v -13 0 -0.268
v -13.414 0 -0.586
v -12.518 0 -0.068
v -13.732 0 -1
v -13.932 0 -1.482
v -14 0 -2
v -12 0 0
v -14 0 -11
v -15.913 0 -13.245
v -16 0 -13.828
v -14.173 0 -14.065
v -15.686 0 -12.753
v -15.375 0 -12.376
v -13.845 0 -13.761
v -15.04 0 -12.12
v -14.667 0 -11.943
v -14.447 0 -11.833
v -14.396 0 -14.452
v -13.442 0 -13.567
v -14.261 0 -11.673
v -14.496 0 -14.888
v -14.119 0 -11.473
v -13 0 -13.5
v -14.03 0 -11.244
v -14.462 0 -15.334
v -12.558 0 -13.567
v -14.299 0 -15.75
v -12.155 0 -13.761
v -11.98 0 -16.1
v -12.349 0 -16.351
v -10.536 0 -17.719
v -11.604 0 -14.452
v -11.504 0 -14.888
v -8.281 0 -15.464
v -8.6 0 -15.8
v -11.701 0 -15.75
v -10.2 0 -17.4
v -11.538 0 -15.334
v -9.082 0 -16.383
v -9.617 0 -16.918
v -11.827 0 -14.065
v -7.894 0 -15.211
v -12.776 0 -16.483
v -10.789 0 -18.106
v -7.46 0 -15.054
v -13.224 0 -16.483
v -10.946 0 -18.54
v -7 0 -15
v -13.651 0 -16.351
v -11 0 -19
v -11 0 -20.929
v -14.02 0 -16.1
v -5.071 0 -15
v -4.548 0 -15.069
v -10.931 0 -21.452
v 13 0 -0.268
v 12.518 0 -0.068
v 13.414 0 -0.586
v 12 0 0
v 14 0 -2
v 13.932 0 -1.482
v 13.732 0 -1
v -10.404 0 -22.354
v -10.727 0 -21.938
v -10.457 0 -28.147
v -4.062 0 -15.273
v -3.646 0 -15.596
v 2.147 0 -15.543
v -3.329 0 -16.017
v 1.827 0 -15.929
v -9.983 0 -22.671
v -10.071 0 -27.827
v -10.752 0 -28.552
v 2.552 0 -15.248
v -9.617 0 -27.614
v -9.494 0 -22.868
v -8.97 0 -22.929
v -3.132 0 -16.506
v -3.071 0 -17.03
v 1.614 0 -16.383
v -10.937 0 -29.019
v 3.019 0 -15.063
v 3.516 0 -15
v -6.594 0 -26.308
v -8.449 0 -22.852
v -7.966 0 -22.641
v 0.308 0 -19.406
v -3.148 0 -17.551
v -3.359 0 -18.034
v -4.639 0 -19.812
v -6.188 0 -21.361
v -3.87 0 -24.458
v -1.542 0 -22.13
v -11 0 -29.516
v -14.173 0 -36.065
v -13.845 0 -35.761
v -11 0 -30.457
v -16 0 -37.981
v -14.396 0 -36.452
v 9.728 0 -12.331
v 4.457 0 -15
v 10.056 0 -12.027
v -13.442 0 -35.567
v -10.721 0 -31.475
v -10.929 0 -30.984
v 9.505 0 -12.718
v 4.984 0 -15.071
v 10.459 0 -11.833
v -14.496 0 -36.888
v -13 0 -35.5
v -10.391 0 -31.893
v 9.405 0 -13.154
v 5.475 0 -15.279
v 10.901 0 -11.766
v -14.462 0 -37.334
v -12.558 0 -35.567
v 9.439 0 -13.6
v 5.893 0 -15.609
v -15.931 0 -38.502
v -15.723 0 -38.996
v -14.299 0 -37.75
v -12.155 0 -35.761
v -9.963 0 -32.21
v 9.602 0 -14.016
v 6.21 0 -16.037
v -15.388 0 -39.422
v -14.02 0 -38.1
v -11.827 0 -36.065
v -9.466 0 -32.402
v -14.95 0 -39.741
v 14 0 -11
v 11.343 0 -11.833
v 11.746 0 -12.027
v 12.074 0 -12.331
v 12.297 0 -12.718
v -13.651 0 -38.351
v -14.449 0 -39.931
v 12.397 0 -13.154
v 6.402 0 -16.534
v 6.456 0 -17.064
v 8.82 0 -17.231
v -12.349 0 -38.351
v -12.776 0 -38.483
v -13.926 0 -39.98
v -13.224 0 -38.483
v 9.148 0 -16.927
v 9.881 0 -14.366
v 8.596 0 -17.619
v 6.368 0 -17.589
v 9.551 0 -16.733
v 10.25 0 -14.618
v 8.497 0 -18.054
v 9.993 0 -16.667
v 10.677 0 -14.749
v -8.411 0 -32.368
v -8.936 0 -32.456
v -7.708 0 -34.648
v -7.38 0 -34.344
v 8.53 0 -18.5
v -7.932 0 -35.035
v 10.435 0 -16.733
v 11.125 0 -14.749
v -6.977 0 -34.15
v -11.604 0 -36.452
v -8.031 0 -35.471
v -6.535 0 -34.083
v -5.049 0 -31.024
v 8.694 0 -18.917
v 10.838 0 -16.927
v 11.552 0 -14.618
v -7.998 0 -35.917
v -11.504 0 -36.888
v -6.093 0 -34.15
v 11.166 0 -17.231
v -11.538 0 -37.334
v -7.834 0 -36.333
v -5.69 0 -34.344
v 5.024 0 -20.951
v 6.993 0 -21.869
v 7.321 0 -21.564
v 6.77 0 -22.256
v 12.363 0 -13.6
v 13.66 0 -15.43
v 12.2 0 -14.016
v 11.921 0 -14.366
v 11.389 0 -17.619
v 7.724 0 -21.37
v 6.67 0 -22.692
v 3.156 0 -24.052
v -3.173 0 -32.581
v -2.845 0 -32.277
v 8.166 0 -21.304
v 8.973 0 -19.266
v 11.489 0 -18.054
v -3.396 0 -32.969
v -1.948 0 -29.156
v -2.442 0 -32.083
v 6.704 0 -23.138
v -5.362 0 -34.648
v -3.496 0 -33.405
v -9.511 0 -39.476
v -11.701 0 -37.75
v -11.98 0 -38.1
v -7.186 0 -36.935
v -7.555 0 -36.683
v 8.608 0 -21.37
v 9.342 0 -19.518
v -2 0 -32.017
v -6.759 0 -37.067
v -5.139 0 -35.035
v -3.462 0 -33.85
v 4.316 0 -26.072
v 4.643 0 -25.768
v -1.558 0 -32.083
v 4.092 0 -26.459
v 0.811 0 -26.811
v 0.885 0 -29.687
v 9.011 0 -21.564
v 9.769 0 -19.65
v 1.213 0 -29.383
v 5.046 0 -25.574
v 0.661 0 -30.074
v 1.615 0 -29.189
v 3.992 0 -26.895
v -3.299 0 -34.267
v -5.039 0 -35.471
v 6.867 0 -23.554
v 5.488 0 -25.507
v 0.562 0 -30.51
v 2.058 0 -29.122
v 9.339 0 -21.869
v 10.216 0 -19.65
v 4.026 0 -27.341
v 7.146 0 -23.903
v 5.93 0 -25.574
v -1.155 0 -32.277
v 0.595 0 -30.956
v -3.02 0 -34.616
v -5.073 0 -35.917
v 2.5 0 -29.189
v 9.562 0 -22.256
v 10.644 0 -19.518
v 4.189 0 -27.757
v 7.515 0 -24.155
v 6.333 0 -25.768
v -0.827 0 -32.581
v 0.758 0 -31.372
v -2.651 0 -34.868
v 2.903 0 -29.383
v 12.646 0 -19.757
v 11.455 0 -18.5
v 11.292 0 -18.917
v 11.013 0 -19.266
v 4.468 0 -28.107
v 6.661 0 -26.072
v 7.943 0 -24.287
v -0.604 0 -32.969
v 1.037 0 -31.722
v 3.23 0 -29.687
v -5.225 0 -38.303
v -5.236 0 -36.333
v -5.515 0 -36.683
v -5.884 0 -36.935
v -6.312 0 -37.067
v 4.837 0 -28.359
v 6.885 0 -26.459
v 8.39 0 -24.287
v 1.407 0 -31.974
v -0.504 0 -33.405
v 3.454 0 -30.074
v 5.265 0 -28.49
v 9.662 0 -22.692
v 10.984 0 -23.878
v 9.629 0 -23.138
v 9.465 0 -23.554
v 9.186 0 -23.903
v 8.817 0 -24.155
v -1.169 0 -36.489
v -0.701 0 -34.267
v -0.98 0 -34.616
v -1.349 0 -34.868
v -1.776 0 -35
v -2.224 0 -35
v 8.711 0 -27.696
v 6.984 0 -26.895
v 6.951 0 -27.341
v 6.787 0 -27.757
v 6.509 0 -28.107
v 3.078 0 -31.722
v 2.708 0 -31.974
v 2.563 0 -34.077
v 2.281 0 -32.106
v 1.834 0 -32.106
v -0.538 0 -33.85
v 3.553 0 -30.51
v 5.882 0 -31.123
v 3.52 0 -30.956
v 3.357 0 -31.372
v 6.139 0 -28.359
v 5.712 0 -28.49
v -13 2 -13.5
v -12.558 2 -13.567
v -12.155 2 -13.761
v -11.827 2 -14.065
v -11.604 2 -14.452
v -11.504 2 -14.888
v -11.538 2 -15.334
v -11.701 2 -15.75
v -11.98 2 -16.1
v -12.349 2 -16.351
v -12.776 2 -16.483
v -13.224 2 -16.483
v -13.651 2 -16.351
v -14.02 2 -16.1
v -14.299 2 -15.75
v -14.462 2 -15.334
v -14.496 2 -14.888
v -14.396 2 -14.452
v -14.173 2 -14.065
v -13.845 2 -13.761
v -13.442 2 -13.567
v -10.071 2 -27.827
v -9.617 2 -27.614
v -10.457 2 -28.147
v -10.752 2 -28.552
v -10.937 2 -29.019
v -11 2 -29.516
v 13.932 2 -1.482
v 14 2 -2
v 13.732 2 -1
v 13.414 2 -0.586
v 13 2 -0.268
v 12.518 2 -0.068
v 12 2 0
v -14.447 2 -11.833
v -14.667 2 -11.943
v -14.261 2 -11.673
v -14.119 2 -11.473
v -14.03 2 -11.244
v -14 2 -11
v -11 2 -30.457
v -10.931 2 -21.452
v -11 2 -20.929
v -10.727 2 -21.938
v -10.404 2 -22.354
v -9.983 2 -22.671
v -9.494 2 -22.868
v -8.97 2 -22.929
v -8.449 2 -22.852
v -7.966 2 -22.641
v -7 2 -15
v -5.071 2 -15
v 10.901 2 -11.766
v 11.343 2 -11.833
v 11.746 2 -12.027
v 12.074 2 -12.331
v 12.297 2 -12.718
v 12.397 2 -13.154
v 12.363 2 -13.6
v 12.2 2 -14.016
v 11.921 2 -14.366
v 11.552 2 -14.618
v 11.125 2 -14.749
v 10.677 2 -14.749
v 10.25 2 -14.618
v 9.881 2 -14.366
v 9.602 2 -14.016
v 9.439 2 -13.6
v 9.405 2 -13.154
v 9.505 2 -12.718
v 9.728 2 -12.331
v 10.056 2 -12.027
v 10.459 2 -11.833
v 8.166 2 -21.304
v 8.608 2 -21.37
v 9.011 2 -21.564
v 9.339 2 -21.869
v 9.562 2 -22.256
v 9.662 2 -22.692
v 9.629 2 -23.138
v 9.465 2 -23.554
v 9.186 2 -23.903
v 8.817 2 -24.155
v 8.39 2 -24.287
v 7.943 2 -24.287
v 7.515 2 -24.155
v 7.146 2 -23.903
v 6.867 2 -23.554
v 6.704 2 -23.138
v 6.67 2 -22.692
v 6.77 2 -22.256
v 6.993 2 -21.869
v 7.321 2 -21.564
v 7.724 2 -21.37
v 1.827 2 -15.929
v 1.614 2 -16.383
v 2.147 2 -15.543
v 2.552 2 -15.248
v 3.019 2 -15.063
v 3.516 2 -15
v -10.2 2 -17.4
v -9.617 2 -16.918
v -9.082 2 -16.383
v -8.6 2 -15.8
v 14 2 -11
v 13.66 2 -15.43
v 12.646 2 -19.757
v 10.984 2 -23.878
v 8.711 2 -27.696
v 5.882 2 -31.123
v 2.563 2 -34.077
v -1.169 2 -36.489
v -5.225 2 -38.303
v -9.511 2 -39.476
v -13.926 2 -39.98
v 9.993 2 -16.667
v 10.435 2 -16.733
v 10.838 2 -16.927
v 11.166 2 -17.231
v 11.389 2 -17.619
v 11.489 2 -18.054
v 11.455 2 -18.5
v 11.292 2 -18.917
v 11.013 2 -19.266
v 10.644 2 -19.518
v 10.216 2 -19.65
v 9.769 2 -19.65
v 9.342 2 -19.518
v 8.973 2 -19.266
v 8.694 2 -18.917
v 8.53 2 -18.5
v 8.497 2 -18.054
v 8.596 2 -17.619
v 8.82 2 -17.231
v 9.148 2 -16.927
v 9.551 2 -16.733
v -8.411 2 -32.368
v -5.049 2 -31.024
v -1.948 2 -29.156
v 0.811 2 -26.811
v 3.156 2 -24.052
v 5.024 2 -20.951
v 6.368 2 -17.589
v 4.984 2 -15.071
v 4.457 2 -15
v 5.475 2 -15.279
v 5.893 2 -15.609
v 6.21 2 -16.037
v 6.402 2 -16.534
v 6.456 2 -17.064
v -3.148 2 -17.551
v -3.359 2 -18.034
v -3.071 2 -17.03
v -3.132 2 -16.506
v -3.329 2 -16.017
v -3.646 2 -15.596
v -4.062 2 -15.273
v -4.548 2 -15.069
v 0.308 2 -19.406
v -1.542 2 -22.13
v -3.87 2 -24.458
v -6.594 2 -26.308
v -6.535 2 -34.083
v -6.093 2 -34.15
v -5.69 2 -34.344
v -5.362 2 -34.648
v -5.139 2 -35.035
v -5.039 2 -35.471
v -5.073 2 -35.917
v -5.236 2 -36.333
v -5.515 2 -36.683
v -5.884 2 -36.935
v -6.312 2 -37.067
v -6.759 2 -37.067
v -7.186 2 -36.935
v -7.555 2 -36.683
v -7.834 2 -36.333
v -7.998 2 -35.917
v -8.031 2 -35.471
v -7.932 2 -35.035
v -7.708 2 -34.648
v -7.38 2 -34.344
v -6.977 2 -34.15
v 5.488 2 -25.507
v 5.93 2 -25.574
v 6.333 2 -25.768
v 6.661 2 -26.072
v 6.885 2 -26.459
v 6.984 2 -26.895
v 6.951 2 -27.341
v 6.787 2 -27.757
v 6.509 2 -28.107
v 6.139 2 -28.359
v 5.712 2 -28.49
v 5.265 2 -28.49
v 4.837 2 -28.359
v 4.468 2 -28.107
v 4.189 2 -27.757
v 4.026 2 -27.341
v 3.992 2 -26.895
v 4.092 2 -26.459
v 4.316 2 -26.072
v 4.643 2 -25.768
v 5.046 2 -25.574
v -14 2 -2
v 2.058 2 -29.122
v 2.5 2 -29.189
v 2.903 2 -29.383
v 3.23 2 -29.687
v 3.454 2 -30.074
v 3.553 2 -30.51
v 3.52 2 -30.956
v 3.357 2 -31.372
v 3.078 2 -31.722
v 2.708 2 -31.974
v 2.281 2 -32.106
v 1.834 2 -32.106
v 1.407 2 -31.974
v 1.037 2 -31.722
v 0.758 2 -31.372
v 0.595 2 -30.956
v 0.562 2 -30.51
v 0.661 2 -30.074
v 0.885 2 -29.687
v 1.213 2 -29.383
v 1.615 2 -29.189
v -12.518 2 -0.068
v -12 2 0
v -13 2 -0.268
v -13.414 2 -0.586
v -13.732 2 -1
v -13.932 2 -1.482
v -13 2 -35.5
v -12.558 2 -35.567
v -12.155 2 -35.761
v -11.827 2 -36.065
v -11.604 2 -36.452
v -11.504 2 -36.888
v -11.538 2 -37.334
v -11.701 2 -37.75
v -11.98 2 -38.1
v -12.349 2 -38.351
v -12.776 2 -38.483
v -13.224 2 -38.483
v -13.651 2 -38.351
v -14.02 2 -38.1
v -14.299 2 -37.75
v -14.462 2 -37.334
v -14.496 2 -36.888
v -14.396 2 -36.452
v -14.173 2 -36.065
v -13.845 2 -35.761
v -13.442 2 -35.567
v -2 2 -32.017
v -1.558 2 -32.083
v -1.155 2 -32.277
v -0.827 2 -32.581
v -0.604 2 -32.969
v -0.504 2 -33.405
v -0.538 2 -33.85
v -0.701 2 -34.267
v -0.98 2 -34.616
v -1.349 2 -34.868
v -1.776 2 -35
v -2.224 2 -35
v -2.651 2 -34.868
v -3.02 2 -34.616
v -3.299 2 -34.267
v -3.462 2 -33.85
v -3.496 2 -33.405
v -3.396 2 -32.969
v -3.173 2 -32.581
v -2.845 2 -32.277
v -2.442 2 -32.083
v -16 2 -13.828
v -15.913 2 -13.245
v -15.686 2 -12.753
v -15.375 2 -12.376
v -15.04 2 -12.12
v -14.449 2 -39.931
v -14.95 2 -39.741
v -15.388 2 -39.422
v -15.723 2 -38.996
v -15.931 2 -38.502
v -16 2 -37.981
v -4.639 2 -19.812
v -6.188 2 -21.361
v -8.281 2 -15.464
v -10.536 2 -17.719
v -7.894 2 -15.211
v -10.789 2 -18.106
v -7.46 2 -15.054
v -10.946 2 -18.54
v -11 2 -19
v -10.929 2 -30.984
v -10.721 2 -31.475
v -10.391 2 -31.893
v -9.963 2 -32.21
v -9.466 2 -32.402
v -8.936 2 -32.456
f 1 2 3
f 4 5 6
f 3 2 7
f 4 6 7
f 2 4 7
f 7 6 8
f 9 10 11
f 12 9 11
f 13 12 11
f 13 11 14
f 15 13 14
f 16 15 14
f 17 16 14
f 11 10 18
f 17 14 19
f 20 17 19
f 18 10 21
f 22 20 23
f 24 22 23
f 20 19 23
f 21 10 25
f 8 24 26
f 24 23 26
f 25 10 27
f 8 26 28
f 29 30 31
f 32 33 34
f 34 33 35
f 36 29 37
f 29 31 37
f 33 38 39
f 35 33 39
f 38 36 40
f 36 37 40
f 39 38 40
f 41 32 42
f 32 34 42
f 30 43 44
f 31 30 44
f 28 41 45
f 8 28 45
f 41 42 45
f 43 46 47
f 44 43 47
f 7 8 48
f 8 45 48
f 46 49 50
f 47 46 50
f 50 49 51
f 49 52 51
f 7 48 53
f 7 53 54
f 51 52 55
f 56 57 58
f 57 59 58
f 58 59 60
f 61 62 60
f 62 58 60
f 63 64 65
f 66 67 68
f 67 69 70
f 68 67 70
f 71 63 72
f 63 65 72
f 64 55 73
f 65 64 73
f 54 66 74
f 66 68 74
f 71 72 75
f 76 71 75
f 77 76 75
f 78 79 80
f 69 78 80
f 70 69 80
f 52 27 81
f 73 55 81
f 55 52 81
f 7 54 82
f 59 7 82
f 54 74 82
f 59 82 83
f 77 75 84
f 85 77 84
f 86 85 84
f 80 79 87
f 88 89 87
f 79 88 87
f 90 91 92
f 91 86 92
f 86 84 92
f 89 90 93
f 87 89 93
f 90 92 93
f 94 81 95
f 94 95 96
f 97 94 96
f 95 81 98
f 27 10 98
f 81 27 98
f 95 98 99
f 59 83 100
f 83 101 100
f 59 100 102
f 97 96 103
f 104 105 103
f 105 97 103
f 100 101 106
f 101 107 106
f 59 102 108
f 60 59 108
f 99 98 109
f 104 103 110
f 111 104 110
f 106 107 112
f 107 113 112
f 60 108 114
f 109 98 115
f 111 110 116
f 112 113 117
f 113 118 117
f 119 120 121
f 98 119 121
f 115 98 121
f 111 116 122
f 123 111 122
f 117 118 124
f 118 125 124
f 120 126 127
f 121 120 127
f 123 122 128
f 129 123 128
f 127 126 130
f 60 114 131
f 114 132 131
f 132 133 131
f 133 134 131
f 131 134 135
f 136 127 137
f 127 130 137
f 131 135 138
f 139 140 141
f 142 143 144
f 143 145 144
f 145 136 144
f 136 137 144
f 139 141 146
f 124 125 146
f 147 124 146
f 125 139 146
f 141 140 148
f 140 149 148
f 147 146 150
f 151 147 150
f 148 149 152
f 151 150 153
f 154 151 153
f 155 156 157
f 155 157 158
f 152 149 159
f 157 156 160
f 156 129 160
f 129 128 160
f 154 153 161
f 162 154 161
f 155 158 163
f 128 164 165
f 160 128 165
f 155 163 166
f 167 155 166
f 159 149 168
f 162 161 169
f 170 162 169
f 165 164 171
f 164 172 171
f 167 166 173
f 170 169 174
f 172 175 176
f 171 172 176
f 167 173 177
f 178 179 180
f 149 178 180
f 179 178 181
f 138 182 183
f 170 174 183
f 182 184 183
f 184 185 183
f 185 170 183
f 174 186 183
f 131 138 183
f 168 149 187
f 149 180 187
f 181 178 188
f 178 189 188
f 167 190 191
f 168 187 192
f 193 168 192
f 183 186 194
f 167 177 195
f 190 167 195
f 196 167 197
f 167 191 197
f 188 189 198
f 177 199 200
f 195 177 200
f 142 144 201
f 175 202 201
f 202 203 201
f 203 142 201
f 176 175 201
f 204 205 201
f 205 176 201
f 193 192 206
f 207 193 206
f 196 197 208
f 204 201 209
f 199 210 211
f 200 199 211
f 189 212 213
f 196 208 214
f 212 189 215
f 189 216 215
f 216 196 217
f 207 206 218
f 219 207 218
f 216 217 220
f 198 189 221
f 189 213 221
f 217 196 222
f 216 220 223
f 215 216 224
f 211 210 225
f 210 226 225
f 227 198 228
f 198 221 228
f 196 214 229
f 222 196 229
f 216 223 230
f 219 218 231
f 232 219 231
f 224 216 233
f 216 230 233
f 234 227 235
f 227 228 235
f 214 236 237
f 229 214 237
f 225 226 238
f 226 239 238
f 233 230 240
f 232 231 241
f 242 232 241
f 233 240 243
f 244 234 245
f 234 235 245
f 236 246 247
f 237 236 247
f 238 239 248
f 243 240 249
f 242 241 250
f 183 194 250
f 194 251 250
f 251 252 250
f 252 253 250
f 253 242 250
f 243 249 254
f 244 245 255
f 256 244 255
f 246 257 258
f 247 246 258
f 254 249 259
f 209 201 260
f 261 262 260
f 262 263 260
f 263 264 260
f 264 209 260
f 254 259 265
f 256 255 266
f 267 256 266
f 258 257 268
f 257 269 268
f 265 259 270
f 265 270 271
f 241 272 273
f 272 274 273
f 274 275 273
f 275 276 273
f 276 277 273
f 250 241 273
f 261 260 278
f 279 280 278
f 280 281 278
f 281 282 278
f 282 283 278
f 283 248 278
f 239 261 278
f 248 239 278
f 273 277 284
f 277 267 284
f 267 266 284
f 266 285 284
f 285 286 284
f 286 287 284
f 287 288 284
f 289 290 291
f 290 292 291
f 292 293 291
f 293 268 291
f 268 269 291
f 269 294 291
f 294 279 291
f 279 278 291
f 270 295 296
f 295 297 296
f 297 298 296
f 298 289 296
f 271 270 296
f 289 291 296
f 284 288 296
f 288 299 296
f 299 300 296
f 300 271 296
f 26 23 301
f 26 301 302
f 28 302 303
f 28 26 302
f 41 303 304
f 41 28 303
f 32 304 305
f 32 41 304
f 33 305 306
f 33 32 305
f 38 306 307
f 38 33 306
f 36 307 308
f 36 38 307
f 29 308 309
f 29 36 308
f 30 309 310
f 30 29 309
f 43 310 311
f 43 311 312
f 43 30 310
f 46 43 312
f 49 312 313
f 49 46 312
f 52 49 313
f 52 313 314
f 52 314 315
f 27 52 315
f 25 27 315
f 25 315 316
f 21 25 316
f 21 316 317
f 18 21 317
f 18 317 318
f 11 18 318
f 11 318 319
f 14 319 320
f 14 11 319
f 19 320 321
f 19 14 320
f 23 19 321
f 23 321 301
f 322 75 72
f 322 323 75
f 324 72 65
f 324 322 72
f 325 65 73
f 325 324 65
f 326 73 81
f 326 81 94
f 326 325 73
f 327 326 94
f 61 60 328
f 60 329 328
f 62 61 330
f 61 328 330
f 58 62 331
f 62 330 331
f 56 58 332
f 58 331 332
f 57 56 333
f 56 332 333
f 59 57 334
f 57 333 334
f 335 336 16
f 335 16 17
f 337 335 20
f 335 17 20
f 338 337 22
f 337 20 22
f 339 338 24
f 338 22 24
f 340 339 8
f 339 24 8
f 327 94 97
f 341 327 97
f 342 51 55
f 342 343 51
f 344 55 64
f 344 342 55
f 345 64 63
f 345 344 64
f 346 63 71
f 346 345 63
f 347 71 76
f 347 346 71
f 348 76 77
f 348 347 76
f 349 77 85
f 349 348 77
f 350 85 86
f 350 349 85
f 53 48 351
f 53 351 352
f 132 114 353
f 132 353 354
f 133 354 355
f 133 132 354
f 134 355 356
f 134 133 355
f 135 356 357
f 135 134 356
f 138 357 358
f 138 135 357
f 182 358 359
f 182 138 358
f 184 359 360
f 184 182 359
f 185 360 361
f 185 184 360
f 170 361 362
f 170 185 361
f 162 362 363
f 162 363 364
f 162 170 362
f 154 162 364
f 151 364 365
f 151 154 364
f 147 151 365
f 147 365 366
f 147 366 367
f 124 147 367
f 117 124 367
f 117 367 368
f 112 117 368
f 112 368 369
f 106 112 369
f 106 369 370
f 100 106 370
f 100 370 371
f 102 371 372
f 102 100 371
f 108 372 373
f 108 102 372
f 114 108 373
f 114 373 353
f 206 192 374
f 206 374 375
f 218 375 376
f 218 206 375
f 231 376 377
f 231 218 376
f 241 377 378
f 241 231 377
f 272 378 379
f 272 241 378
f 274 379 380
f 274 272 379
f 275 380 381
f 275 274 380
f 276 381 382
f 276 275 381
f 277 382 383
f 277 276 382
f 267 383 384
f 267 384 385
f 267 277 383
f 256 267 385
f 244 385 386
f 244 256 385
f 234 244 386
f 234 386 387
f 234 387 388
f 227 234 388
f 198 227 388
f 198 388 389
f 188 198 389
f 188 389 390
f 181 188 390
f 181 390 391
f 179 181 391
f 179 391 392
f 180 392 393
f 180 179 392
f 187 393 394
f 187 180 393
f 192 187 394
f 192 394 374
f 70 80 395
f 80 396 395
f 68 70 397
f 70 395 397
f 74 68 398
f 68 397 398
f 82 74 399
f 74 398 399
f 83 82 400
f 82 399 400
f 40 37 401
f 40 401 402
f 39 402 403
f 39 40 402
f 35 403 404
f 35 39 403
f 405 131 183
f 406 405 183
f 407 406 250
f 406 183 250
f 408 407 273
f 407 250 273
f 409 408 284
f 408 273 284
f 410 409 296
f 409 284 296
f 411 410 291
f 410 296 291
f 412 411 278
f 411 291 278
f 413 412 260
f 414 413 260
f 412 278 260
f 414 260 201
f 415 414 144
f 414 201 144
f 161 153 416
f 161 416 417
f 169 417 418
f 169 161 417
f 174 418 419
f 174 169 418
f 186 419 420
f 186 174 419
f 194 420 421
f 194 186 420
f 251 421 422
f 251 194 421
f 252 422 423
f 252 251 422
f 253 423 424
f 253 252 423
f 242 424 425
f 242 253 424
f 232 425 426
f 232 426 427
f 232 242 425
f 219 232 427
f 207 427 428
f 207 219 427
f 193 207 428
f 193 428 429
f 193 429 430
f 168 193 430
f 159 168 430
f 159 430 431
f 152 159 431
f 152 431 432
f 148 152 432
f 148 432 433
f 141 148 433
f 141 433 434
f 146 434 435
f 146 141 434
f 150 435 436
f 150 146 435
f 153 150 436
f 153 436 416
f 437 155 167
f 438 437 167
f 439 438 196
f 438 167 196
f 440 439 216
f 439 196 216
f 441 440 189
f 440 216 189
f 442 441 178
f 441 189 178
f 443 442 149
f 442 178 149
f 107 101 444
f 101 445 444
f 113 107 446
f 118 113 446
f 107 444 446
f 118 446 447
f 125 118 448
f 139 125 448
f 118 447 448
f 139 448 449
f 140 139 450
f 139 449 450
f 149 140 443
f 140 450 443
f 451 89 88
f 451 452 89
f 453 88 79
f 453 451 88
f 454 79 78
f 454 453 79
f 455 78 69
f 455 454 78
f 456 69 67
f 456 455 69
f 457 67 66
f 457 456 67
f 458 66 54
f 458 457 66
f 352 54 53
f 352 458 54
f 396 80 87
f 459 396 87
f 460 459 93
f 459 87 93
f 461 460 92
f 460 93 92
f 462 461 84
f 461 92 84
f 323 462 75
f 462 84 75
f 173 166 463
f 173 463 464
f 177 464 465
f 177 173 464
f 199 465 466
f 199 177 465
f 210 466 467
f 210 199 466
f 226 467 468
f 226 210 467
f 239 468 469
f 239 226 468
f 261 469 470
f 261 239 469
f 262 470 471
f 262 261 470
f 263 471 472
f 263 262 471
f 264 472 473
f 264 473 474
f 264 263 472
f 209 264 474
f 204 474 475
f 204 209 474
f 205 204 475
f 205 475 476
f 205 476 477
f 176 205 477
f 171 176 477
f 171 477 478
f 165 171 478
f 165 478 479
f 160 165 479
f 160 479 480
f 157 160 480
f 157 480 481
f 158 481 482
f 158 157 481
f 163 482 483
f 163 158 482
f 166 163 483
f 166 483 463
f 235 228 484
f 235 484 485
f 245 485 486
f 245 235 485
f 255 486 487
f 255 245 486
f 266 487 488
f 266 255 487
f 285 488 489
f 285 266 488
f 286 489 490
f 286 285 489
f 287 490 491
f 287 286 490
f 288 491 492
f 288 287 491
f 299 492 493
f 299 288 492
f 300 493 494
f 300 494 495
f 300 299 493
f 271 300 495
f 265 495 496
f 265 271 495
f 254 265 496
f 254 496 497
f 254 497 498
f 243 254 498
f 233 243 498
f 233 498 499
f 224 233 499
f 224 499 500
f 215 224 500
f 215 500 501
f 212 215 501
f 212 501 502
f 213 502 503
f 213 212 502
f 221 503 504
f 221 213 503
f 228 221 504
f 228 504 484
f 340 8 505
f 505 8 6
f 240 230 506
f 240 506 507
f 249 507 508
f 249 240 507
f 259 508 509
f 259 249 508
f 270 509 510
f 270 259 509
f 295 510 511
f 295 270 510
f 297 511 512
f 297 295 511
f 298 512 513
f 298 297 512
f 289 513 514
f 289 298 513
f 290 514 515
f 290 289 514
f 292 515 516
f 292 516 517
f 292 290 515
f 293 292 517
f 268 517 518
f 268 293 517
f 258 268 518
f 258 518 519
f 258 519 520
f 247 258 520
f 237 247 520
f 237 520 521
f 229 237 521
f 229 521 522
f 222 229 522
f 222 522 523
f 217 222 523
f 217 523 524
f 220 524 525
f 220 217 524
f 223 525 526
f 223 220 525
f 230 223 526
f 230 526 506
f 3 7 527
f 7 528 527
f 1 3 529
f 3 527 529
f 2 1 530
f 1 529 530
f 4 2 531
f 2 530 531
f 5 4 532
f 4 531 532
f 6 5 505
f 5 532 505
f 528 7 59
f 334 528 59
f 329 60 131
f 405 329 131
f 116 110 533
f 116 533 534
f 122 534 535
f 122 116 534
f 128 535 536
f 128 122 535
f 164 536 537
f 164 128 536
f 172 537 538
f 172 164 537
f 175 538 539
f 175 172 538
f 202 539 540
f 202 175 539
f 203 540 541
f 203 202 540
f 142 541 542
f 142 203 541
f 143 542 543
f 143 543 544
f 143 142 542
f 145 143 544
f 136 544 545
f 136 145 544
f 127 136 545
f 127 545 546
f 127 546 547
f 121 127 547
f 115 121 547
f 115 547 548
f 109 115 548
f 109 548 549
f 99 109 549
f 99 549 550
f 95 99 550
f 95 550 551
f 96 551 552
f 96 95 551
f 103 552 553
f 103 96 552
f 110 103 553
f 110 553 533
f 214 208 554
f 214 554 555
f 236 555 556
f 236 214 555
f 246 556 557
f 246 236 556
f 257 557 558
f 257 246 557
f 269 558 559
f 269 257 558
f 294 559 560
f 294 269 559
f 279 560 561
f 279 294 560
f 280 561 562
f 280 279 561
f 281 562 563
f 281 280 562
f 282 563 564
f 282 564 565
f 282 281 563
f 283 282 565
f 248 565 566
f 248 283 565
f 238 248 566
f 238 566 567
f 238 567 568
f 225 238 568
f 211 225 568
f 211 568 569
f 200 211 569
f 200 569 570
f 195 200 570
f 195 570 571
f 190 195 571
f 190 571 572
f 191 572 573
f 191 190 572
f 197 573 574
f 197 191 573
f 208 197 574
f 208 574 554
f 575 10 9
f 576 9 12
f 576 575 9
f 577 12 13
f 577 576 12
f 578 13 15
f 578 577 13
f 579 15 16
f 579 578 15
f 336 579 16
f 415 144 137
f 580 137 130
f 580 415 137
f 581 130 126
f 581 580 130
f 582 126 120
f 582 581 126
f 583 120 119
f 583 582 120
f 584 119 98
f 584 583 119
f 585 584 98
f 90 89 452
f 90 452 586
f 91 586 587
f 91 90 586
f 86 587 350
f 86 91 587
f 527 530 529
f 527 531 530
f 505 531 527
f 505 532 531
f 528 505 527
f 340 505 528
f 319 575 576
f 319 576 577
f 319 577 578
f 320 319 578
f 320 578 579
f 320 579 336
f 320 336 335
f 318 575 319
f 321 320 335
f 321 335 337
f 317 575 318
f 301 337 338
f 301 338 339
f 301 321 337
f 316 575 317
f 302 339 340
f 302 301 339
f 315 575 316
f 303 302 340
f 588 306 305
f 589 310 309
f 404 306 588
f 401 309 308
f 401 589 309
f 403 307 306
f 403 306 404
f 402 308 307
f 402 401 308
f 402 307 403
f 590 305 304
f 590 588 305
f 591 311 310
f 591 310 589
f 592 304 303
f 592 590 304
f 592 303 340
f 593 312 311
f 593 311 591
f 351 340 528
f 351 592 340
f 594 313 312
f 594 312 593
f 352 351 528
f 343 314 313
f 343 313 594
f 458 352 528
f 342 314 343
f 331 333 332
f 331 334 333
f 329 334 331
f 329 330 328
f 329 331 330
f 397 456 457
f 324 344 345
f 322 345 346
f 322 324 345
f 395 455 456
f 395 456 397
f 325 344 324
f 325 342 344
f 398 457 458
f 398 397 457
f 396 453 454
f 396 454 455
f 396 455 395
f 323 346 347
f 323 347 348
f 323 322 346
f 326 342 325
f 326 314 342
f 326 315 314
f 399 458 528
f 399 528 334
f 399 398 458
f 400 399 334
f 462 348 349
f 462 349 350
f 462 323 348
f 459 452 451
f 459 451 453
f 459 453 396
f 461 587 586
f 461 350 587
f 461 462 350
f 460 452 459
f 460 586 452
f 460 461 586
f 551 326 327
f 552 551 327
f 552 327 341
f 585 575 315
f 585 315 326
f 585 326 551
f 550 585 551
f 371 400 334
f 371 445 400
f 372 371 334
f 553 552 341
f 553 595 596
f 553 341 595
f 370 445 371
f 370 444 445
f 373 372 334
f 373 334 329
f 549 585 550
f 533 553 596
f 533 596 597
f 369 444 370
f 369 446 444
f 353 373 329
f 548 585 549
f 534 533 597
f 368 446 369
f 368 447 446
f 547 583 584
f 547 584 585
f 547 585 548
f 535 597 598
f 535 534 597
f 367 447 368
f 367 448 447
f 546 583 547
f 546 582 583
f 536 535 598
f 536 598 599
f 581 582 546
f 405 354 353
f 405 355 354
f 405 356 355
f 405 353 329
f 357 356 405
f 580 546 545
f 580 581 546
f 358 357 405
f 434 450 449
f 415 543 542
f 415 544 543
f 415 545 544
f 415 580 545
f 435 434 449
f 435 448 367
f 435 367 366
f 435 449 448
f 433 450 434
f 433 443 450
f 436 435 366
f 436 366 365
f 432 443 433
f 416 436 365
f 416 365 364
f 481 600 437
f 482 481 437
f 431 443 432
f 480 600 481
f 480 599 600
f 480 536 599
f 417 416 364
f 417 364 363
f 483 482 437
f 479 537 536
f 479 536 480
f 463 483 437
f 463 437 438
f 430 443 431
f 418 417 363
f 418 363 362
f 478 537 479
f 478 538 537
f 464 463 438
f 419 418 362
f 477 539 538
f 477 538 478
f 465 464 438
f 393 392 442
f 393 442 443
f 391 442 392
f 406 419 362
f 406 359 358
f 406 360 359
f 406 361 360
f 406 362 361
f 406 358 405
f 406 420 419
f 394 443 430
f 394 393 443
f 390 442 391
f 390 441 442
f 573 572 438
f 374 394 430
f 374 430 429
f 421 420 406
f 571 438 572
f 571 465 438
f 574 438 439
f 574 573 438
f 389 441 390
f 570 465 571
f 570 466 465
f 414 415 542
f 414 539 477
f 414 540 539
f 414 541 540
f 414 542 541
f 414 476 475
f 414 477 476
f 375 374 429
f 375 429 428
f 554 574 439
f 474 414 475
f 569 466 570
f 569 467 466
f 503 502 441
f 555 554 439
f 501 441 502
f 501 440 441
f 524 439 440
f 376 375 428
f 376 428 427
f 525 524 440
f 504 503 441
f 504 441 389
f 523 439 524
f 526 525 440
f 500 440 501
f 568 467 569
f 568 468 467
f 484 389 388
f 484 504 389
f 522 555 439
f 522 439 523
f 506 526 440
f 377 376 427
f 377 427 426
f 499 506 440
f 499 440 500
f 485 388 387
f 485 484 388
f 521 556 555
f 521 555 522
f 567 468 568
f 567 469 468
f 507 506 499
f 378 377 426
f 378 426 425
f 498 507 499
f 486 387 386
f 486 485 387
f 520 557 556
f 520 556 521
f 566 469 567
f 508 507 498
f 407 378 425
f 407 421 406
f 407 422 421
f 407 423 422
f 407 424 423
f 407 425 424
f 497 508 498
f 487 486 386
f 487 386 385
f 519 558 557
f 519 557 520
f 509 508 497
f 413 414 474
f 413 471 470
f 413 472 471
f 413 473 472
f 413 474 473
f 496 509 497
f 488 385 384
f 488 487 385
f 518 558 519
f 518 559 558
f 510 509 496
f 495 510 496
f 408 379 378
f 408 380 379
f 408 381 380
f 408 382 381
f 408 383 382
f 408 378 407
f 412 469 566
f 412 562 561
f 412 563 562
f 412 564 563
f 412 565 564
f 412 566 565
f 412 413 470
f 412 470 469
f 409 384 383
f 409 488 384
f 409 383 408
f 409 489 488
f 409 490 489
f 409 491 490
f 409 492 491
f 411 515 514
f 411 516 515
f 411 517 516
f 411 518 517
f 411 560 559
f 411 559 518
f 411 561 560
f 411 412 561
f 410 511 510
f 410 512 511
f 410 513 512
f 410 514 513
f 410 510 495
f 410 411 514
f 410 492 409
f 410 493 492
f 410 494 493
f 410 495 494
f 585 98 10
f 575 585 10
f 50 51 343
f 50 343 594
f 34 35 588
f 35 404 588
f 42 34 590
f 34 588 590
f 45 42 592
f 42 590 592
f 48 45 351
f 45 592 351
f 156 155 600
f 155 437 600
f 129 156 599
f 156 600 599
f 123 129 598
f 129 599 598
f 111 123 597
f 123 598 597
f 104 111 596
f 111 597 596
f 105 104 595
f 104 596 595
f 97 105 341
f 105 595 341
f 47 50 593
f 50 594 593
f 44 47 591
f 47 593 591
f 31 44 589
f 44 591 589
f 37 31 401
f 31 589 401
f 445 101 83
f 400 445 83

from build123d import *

# Parameters (mm, degrees)
SKETCH_1_R      = 1.5
EXTRUDE_1_DEPTH = 2
FILLET_1_R      = 2


with BuildPart() as part:
    # 草图1 → 凸台-拉伸1 (new body)
    with BuildSketch(Plane(origin=(0, 0, 0), x_dir=(1, 0, 0), z_dir=(0, 1, 0))):
        with BuildLine():
            Line((-11, 0), (0, 0))
            Line((0, 0), (11, 0))
            Line((11, 0), (14, 0))
            Line((14, 0), (14, 11))
            ThreePointArc((14, 11), (5.506096654, 31.506096654), (-15, 40))
            Line((-15, 40), (-16, 40))
            Line((-16, 40), (-16, 12))
            Line((-16, 12), (-15, 12))
            ThreePointArc((-15, 12), (-14.292893219, 11.707106781), (-14, 11))
            Line((-14, 11), (-14, 0))
            Line((-14, 0), (-11, 0))
        make_face()
        with Locations(Location((10.90106215, 13.266049311, 0), (0, 0, 270))):
            Circle(SKETCH_1_R, mode=Mode.SUBTRACT)
        with Locations(Location((9.992804094, 18.166571251, 0), (0, 0, 270))):
            Circle(SKETCH_1_R, mode=Mode.SUBTRACT)
        with Locations(Location((8.166169629, 22.803752993, 0), (0, 0, 270))):
            Circle(SKETCH_1_R, mode=Mode.SUBTRACT)
        with Locations(Location((5.488279594, 27.007198358, 0), (0, 0, 270))):
            Circle(SKETCH_1_R, mode=Mode.SUBTRACT)
        with Locations(Location((2.057534754, 30.622449086, 0), (0, 0, 270))):
            Circle(SKETCH_1_R, mode=Mode.SUBTRACT)
        with Locations(Location((-2, 33.516660498, 0), (0, 0, 270))):
            Circle(SKETCH_1_R, mode=Mode.SUBTRACT)
        with Locations(Location((-6.535227984, 35.583482966, 0), (0, 0, 270))):
            Circle(SKETCH_1_R, mode=Mode.SUBTRACT)
        with Locations(Location((-13, 15, 0), (0, 0, 270))):
            Circle(SKETCH_1_R, mode=Mode.SUBTRACT)
        with Locations(Location((-13, 37, 0), (0, 0, 270))):
            Circle(SKETCH_1_R, mode=Mode.SUBTRACT)
        with BuildLine():
            Line((-11, 24), (-11, 17.92820323))
            ThreePointArc((-11, 17.92820323), (-9.343145751, 16.656854249), (-8.07179677, 15))
            Line((-8.07179677, 15), (-2, 15))
            ThreePointArc((-2, 15), (-5.382307969, 20.617692031), (-11, 24))
        make_face(mode=Mode.SUBTRACT)
        with BuildLine():
            Line((-11, 28), (-11, 33))
            ThreePointArc((-11, 33), (0.811388301, 26.811388301), (7, 15))
            Line((7, 15), (2, 15))
            ThreePointArc((2, 15), (-2.650910965, 23.349089035), (-11, 28))
        make_face(mode=Mode.SUBTRACT)
    extrude(amount=EXTRUDE_1_DEPTH)

    # 圆角1
    fillet_1_edges = [part.edges().sort_by_distance(p)[0] for p in [
        (-14, 1, 0),
        (-16, 1, -12),
        (-16, 1, -40),
        (14, 1, 0),
        (-11, 1, -17.92820323),
        (-8.07179677, 1, -15),
        (-2, 1, -15),
        (-11, 1, -24),
        (7, 1, -15),
        (-11, 1, -28),
        (2, 1, -15),
        (-11, 1, -33),
    ]]
    fillet(fillet_1_edges, radius=FILLET_1_R)


solid = part.part
